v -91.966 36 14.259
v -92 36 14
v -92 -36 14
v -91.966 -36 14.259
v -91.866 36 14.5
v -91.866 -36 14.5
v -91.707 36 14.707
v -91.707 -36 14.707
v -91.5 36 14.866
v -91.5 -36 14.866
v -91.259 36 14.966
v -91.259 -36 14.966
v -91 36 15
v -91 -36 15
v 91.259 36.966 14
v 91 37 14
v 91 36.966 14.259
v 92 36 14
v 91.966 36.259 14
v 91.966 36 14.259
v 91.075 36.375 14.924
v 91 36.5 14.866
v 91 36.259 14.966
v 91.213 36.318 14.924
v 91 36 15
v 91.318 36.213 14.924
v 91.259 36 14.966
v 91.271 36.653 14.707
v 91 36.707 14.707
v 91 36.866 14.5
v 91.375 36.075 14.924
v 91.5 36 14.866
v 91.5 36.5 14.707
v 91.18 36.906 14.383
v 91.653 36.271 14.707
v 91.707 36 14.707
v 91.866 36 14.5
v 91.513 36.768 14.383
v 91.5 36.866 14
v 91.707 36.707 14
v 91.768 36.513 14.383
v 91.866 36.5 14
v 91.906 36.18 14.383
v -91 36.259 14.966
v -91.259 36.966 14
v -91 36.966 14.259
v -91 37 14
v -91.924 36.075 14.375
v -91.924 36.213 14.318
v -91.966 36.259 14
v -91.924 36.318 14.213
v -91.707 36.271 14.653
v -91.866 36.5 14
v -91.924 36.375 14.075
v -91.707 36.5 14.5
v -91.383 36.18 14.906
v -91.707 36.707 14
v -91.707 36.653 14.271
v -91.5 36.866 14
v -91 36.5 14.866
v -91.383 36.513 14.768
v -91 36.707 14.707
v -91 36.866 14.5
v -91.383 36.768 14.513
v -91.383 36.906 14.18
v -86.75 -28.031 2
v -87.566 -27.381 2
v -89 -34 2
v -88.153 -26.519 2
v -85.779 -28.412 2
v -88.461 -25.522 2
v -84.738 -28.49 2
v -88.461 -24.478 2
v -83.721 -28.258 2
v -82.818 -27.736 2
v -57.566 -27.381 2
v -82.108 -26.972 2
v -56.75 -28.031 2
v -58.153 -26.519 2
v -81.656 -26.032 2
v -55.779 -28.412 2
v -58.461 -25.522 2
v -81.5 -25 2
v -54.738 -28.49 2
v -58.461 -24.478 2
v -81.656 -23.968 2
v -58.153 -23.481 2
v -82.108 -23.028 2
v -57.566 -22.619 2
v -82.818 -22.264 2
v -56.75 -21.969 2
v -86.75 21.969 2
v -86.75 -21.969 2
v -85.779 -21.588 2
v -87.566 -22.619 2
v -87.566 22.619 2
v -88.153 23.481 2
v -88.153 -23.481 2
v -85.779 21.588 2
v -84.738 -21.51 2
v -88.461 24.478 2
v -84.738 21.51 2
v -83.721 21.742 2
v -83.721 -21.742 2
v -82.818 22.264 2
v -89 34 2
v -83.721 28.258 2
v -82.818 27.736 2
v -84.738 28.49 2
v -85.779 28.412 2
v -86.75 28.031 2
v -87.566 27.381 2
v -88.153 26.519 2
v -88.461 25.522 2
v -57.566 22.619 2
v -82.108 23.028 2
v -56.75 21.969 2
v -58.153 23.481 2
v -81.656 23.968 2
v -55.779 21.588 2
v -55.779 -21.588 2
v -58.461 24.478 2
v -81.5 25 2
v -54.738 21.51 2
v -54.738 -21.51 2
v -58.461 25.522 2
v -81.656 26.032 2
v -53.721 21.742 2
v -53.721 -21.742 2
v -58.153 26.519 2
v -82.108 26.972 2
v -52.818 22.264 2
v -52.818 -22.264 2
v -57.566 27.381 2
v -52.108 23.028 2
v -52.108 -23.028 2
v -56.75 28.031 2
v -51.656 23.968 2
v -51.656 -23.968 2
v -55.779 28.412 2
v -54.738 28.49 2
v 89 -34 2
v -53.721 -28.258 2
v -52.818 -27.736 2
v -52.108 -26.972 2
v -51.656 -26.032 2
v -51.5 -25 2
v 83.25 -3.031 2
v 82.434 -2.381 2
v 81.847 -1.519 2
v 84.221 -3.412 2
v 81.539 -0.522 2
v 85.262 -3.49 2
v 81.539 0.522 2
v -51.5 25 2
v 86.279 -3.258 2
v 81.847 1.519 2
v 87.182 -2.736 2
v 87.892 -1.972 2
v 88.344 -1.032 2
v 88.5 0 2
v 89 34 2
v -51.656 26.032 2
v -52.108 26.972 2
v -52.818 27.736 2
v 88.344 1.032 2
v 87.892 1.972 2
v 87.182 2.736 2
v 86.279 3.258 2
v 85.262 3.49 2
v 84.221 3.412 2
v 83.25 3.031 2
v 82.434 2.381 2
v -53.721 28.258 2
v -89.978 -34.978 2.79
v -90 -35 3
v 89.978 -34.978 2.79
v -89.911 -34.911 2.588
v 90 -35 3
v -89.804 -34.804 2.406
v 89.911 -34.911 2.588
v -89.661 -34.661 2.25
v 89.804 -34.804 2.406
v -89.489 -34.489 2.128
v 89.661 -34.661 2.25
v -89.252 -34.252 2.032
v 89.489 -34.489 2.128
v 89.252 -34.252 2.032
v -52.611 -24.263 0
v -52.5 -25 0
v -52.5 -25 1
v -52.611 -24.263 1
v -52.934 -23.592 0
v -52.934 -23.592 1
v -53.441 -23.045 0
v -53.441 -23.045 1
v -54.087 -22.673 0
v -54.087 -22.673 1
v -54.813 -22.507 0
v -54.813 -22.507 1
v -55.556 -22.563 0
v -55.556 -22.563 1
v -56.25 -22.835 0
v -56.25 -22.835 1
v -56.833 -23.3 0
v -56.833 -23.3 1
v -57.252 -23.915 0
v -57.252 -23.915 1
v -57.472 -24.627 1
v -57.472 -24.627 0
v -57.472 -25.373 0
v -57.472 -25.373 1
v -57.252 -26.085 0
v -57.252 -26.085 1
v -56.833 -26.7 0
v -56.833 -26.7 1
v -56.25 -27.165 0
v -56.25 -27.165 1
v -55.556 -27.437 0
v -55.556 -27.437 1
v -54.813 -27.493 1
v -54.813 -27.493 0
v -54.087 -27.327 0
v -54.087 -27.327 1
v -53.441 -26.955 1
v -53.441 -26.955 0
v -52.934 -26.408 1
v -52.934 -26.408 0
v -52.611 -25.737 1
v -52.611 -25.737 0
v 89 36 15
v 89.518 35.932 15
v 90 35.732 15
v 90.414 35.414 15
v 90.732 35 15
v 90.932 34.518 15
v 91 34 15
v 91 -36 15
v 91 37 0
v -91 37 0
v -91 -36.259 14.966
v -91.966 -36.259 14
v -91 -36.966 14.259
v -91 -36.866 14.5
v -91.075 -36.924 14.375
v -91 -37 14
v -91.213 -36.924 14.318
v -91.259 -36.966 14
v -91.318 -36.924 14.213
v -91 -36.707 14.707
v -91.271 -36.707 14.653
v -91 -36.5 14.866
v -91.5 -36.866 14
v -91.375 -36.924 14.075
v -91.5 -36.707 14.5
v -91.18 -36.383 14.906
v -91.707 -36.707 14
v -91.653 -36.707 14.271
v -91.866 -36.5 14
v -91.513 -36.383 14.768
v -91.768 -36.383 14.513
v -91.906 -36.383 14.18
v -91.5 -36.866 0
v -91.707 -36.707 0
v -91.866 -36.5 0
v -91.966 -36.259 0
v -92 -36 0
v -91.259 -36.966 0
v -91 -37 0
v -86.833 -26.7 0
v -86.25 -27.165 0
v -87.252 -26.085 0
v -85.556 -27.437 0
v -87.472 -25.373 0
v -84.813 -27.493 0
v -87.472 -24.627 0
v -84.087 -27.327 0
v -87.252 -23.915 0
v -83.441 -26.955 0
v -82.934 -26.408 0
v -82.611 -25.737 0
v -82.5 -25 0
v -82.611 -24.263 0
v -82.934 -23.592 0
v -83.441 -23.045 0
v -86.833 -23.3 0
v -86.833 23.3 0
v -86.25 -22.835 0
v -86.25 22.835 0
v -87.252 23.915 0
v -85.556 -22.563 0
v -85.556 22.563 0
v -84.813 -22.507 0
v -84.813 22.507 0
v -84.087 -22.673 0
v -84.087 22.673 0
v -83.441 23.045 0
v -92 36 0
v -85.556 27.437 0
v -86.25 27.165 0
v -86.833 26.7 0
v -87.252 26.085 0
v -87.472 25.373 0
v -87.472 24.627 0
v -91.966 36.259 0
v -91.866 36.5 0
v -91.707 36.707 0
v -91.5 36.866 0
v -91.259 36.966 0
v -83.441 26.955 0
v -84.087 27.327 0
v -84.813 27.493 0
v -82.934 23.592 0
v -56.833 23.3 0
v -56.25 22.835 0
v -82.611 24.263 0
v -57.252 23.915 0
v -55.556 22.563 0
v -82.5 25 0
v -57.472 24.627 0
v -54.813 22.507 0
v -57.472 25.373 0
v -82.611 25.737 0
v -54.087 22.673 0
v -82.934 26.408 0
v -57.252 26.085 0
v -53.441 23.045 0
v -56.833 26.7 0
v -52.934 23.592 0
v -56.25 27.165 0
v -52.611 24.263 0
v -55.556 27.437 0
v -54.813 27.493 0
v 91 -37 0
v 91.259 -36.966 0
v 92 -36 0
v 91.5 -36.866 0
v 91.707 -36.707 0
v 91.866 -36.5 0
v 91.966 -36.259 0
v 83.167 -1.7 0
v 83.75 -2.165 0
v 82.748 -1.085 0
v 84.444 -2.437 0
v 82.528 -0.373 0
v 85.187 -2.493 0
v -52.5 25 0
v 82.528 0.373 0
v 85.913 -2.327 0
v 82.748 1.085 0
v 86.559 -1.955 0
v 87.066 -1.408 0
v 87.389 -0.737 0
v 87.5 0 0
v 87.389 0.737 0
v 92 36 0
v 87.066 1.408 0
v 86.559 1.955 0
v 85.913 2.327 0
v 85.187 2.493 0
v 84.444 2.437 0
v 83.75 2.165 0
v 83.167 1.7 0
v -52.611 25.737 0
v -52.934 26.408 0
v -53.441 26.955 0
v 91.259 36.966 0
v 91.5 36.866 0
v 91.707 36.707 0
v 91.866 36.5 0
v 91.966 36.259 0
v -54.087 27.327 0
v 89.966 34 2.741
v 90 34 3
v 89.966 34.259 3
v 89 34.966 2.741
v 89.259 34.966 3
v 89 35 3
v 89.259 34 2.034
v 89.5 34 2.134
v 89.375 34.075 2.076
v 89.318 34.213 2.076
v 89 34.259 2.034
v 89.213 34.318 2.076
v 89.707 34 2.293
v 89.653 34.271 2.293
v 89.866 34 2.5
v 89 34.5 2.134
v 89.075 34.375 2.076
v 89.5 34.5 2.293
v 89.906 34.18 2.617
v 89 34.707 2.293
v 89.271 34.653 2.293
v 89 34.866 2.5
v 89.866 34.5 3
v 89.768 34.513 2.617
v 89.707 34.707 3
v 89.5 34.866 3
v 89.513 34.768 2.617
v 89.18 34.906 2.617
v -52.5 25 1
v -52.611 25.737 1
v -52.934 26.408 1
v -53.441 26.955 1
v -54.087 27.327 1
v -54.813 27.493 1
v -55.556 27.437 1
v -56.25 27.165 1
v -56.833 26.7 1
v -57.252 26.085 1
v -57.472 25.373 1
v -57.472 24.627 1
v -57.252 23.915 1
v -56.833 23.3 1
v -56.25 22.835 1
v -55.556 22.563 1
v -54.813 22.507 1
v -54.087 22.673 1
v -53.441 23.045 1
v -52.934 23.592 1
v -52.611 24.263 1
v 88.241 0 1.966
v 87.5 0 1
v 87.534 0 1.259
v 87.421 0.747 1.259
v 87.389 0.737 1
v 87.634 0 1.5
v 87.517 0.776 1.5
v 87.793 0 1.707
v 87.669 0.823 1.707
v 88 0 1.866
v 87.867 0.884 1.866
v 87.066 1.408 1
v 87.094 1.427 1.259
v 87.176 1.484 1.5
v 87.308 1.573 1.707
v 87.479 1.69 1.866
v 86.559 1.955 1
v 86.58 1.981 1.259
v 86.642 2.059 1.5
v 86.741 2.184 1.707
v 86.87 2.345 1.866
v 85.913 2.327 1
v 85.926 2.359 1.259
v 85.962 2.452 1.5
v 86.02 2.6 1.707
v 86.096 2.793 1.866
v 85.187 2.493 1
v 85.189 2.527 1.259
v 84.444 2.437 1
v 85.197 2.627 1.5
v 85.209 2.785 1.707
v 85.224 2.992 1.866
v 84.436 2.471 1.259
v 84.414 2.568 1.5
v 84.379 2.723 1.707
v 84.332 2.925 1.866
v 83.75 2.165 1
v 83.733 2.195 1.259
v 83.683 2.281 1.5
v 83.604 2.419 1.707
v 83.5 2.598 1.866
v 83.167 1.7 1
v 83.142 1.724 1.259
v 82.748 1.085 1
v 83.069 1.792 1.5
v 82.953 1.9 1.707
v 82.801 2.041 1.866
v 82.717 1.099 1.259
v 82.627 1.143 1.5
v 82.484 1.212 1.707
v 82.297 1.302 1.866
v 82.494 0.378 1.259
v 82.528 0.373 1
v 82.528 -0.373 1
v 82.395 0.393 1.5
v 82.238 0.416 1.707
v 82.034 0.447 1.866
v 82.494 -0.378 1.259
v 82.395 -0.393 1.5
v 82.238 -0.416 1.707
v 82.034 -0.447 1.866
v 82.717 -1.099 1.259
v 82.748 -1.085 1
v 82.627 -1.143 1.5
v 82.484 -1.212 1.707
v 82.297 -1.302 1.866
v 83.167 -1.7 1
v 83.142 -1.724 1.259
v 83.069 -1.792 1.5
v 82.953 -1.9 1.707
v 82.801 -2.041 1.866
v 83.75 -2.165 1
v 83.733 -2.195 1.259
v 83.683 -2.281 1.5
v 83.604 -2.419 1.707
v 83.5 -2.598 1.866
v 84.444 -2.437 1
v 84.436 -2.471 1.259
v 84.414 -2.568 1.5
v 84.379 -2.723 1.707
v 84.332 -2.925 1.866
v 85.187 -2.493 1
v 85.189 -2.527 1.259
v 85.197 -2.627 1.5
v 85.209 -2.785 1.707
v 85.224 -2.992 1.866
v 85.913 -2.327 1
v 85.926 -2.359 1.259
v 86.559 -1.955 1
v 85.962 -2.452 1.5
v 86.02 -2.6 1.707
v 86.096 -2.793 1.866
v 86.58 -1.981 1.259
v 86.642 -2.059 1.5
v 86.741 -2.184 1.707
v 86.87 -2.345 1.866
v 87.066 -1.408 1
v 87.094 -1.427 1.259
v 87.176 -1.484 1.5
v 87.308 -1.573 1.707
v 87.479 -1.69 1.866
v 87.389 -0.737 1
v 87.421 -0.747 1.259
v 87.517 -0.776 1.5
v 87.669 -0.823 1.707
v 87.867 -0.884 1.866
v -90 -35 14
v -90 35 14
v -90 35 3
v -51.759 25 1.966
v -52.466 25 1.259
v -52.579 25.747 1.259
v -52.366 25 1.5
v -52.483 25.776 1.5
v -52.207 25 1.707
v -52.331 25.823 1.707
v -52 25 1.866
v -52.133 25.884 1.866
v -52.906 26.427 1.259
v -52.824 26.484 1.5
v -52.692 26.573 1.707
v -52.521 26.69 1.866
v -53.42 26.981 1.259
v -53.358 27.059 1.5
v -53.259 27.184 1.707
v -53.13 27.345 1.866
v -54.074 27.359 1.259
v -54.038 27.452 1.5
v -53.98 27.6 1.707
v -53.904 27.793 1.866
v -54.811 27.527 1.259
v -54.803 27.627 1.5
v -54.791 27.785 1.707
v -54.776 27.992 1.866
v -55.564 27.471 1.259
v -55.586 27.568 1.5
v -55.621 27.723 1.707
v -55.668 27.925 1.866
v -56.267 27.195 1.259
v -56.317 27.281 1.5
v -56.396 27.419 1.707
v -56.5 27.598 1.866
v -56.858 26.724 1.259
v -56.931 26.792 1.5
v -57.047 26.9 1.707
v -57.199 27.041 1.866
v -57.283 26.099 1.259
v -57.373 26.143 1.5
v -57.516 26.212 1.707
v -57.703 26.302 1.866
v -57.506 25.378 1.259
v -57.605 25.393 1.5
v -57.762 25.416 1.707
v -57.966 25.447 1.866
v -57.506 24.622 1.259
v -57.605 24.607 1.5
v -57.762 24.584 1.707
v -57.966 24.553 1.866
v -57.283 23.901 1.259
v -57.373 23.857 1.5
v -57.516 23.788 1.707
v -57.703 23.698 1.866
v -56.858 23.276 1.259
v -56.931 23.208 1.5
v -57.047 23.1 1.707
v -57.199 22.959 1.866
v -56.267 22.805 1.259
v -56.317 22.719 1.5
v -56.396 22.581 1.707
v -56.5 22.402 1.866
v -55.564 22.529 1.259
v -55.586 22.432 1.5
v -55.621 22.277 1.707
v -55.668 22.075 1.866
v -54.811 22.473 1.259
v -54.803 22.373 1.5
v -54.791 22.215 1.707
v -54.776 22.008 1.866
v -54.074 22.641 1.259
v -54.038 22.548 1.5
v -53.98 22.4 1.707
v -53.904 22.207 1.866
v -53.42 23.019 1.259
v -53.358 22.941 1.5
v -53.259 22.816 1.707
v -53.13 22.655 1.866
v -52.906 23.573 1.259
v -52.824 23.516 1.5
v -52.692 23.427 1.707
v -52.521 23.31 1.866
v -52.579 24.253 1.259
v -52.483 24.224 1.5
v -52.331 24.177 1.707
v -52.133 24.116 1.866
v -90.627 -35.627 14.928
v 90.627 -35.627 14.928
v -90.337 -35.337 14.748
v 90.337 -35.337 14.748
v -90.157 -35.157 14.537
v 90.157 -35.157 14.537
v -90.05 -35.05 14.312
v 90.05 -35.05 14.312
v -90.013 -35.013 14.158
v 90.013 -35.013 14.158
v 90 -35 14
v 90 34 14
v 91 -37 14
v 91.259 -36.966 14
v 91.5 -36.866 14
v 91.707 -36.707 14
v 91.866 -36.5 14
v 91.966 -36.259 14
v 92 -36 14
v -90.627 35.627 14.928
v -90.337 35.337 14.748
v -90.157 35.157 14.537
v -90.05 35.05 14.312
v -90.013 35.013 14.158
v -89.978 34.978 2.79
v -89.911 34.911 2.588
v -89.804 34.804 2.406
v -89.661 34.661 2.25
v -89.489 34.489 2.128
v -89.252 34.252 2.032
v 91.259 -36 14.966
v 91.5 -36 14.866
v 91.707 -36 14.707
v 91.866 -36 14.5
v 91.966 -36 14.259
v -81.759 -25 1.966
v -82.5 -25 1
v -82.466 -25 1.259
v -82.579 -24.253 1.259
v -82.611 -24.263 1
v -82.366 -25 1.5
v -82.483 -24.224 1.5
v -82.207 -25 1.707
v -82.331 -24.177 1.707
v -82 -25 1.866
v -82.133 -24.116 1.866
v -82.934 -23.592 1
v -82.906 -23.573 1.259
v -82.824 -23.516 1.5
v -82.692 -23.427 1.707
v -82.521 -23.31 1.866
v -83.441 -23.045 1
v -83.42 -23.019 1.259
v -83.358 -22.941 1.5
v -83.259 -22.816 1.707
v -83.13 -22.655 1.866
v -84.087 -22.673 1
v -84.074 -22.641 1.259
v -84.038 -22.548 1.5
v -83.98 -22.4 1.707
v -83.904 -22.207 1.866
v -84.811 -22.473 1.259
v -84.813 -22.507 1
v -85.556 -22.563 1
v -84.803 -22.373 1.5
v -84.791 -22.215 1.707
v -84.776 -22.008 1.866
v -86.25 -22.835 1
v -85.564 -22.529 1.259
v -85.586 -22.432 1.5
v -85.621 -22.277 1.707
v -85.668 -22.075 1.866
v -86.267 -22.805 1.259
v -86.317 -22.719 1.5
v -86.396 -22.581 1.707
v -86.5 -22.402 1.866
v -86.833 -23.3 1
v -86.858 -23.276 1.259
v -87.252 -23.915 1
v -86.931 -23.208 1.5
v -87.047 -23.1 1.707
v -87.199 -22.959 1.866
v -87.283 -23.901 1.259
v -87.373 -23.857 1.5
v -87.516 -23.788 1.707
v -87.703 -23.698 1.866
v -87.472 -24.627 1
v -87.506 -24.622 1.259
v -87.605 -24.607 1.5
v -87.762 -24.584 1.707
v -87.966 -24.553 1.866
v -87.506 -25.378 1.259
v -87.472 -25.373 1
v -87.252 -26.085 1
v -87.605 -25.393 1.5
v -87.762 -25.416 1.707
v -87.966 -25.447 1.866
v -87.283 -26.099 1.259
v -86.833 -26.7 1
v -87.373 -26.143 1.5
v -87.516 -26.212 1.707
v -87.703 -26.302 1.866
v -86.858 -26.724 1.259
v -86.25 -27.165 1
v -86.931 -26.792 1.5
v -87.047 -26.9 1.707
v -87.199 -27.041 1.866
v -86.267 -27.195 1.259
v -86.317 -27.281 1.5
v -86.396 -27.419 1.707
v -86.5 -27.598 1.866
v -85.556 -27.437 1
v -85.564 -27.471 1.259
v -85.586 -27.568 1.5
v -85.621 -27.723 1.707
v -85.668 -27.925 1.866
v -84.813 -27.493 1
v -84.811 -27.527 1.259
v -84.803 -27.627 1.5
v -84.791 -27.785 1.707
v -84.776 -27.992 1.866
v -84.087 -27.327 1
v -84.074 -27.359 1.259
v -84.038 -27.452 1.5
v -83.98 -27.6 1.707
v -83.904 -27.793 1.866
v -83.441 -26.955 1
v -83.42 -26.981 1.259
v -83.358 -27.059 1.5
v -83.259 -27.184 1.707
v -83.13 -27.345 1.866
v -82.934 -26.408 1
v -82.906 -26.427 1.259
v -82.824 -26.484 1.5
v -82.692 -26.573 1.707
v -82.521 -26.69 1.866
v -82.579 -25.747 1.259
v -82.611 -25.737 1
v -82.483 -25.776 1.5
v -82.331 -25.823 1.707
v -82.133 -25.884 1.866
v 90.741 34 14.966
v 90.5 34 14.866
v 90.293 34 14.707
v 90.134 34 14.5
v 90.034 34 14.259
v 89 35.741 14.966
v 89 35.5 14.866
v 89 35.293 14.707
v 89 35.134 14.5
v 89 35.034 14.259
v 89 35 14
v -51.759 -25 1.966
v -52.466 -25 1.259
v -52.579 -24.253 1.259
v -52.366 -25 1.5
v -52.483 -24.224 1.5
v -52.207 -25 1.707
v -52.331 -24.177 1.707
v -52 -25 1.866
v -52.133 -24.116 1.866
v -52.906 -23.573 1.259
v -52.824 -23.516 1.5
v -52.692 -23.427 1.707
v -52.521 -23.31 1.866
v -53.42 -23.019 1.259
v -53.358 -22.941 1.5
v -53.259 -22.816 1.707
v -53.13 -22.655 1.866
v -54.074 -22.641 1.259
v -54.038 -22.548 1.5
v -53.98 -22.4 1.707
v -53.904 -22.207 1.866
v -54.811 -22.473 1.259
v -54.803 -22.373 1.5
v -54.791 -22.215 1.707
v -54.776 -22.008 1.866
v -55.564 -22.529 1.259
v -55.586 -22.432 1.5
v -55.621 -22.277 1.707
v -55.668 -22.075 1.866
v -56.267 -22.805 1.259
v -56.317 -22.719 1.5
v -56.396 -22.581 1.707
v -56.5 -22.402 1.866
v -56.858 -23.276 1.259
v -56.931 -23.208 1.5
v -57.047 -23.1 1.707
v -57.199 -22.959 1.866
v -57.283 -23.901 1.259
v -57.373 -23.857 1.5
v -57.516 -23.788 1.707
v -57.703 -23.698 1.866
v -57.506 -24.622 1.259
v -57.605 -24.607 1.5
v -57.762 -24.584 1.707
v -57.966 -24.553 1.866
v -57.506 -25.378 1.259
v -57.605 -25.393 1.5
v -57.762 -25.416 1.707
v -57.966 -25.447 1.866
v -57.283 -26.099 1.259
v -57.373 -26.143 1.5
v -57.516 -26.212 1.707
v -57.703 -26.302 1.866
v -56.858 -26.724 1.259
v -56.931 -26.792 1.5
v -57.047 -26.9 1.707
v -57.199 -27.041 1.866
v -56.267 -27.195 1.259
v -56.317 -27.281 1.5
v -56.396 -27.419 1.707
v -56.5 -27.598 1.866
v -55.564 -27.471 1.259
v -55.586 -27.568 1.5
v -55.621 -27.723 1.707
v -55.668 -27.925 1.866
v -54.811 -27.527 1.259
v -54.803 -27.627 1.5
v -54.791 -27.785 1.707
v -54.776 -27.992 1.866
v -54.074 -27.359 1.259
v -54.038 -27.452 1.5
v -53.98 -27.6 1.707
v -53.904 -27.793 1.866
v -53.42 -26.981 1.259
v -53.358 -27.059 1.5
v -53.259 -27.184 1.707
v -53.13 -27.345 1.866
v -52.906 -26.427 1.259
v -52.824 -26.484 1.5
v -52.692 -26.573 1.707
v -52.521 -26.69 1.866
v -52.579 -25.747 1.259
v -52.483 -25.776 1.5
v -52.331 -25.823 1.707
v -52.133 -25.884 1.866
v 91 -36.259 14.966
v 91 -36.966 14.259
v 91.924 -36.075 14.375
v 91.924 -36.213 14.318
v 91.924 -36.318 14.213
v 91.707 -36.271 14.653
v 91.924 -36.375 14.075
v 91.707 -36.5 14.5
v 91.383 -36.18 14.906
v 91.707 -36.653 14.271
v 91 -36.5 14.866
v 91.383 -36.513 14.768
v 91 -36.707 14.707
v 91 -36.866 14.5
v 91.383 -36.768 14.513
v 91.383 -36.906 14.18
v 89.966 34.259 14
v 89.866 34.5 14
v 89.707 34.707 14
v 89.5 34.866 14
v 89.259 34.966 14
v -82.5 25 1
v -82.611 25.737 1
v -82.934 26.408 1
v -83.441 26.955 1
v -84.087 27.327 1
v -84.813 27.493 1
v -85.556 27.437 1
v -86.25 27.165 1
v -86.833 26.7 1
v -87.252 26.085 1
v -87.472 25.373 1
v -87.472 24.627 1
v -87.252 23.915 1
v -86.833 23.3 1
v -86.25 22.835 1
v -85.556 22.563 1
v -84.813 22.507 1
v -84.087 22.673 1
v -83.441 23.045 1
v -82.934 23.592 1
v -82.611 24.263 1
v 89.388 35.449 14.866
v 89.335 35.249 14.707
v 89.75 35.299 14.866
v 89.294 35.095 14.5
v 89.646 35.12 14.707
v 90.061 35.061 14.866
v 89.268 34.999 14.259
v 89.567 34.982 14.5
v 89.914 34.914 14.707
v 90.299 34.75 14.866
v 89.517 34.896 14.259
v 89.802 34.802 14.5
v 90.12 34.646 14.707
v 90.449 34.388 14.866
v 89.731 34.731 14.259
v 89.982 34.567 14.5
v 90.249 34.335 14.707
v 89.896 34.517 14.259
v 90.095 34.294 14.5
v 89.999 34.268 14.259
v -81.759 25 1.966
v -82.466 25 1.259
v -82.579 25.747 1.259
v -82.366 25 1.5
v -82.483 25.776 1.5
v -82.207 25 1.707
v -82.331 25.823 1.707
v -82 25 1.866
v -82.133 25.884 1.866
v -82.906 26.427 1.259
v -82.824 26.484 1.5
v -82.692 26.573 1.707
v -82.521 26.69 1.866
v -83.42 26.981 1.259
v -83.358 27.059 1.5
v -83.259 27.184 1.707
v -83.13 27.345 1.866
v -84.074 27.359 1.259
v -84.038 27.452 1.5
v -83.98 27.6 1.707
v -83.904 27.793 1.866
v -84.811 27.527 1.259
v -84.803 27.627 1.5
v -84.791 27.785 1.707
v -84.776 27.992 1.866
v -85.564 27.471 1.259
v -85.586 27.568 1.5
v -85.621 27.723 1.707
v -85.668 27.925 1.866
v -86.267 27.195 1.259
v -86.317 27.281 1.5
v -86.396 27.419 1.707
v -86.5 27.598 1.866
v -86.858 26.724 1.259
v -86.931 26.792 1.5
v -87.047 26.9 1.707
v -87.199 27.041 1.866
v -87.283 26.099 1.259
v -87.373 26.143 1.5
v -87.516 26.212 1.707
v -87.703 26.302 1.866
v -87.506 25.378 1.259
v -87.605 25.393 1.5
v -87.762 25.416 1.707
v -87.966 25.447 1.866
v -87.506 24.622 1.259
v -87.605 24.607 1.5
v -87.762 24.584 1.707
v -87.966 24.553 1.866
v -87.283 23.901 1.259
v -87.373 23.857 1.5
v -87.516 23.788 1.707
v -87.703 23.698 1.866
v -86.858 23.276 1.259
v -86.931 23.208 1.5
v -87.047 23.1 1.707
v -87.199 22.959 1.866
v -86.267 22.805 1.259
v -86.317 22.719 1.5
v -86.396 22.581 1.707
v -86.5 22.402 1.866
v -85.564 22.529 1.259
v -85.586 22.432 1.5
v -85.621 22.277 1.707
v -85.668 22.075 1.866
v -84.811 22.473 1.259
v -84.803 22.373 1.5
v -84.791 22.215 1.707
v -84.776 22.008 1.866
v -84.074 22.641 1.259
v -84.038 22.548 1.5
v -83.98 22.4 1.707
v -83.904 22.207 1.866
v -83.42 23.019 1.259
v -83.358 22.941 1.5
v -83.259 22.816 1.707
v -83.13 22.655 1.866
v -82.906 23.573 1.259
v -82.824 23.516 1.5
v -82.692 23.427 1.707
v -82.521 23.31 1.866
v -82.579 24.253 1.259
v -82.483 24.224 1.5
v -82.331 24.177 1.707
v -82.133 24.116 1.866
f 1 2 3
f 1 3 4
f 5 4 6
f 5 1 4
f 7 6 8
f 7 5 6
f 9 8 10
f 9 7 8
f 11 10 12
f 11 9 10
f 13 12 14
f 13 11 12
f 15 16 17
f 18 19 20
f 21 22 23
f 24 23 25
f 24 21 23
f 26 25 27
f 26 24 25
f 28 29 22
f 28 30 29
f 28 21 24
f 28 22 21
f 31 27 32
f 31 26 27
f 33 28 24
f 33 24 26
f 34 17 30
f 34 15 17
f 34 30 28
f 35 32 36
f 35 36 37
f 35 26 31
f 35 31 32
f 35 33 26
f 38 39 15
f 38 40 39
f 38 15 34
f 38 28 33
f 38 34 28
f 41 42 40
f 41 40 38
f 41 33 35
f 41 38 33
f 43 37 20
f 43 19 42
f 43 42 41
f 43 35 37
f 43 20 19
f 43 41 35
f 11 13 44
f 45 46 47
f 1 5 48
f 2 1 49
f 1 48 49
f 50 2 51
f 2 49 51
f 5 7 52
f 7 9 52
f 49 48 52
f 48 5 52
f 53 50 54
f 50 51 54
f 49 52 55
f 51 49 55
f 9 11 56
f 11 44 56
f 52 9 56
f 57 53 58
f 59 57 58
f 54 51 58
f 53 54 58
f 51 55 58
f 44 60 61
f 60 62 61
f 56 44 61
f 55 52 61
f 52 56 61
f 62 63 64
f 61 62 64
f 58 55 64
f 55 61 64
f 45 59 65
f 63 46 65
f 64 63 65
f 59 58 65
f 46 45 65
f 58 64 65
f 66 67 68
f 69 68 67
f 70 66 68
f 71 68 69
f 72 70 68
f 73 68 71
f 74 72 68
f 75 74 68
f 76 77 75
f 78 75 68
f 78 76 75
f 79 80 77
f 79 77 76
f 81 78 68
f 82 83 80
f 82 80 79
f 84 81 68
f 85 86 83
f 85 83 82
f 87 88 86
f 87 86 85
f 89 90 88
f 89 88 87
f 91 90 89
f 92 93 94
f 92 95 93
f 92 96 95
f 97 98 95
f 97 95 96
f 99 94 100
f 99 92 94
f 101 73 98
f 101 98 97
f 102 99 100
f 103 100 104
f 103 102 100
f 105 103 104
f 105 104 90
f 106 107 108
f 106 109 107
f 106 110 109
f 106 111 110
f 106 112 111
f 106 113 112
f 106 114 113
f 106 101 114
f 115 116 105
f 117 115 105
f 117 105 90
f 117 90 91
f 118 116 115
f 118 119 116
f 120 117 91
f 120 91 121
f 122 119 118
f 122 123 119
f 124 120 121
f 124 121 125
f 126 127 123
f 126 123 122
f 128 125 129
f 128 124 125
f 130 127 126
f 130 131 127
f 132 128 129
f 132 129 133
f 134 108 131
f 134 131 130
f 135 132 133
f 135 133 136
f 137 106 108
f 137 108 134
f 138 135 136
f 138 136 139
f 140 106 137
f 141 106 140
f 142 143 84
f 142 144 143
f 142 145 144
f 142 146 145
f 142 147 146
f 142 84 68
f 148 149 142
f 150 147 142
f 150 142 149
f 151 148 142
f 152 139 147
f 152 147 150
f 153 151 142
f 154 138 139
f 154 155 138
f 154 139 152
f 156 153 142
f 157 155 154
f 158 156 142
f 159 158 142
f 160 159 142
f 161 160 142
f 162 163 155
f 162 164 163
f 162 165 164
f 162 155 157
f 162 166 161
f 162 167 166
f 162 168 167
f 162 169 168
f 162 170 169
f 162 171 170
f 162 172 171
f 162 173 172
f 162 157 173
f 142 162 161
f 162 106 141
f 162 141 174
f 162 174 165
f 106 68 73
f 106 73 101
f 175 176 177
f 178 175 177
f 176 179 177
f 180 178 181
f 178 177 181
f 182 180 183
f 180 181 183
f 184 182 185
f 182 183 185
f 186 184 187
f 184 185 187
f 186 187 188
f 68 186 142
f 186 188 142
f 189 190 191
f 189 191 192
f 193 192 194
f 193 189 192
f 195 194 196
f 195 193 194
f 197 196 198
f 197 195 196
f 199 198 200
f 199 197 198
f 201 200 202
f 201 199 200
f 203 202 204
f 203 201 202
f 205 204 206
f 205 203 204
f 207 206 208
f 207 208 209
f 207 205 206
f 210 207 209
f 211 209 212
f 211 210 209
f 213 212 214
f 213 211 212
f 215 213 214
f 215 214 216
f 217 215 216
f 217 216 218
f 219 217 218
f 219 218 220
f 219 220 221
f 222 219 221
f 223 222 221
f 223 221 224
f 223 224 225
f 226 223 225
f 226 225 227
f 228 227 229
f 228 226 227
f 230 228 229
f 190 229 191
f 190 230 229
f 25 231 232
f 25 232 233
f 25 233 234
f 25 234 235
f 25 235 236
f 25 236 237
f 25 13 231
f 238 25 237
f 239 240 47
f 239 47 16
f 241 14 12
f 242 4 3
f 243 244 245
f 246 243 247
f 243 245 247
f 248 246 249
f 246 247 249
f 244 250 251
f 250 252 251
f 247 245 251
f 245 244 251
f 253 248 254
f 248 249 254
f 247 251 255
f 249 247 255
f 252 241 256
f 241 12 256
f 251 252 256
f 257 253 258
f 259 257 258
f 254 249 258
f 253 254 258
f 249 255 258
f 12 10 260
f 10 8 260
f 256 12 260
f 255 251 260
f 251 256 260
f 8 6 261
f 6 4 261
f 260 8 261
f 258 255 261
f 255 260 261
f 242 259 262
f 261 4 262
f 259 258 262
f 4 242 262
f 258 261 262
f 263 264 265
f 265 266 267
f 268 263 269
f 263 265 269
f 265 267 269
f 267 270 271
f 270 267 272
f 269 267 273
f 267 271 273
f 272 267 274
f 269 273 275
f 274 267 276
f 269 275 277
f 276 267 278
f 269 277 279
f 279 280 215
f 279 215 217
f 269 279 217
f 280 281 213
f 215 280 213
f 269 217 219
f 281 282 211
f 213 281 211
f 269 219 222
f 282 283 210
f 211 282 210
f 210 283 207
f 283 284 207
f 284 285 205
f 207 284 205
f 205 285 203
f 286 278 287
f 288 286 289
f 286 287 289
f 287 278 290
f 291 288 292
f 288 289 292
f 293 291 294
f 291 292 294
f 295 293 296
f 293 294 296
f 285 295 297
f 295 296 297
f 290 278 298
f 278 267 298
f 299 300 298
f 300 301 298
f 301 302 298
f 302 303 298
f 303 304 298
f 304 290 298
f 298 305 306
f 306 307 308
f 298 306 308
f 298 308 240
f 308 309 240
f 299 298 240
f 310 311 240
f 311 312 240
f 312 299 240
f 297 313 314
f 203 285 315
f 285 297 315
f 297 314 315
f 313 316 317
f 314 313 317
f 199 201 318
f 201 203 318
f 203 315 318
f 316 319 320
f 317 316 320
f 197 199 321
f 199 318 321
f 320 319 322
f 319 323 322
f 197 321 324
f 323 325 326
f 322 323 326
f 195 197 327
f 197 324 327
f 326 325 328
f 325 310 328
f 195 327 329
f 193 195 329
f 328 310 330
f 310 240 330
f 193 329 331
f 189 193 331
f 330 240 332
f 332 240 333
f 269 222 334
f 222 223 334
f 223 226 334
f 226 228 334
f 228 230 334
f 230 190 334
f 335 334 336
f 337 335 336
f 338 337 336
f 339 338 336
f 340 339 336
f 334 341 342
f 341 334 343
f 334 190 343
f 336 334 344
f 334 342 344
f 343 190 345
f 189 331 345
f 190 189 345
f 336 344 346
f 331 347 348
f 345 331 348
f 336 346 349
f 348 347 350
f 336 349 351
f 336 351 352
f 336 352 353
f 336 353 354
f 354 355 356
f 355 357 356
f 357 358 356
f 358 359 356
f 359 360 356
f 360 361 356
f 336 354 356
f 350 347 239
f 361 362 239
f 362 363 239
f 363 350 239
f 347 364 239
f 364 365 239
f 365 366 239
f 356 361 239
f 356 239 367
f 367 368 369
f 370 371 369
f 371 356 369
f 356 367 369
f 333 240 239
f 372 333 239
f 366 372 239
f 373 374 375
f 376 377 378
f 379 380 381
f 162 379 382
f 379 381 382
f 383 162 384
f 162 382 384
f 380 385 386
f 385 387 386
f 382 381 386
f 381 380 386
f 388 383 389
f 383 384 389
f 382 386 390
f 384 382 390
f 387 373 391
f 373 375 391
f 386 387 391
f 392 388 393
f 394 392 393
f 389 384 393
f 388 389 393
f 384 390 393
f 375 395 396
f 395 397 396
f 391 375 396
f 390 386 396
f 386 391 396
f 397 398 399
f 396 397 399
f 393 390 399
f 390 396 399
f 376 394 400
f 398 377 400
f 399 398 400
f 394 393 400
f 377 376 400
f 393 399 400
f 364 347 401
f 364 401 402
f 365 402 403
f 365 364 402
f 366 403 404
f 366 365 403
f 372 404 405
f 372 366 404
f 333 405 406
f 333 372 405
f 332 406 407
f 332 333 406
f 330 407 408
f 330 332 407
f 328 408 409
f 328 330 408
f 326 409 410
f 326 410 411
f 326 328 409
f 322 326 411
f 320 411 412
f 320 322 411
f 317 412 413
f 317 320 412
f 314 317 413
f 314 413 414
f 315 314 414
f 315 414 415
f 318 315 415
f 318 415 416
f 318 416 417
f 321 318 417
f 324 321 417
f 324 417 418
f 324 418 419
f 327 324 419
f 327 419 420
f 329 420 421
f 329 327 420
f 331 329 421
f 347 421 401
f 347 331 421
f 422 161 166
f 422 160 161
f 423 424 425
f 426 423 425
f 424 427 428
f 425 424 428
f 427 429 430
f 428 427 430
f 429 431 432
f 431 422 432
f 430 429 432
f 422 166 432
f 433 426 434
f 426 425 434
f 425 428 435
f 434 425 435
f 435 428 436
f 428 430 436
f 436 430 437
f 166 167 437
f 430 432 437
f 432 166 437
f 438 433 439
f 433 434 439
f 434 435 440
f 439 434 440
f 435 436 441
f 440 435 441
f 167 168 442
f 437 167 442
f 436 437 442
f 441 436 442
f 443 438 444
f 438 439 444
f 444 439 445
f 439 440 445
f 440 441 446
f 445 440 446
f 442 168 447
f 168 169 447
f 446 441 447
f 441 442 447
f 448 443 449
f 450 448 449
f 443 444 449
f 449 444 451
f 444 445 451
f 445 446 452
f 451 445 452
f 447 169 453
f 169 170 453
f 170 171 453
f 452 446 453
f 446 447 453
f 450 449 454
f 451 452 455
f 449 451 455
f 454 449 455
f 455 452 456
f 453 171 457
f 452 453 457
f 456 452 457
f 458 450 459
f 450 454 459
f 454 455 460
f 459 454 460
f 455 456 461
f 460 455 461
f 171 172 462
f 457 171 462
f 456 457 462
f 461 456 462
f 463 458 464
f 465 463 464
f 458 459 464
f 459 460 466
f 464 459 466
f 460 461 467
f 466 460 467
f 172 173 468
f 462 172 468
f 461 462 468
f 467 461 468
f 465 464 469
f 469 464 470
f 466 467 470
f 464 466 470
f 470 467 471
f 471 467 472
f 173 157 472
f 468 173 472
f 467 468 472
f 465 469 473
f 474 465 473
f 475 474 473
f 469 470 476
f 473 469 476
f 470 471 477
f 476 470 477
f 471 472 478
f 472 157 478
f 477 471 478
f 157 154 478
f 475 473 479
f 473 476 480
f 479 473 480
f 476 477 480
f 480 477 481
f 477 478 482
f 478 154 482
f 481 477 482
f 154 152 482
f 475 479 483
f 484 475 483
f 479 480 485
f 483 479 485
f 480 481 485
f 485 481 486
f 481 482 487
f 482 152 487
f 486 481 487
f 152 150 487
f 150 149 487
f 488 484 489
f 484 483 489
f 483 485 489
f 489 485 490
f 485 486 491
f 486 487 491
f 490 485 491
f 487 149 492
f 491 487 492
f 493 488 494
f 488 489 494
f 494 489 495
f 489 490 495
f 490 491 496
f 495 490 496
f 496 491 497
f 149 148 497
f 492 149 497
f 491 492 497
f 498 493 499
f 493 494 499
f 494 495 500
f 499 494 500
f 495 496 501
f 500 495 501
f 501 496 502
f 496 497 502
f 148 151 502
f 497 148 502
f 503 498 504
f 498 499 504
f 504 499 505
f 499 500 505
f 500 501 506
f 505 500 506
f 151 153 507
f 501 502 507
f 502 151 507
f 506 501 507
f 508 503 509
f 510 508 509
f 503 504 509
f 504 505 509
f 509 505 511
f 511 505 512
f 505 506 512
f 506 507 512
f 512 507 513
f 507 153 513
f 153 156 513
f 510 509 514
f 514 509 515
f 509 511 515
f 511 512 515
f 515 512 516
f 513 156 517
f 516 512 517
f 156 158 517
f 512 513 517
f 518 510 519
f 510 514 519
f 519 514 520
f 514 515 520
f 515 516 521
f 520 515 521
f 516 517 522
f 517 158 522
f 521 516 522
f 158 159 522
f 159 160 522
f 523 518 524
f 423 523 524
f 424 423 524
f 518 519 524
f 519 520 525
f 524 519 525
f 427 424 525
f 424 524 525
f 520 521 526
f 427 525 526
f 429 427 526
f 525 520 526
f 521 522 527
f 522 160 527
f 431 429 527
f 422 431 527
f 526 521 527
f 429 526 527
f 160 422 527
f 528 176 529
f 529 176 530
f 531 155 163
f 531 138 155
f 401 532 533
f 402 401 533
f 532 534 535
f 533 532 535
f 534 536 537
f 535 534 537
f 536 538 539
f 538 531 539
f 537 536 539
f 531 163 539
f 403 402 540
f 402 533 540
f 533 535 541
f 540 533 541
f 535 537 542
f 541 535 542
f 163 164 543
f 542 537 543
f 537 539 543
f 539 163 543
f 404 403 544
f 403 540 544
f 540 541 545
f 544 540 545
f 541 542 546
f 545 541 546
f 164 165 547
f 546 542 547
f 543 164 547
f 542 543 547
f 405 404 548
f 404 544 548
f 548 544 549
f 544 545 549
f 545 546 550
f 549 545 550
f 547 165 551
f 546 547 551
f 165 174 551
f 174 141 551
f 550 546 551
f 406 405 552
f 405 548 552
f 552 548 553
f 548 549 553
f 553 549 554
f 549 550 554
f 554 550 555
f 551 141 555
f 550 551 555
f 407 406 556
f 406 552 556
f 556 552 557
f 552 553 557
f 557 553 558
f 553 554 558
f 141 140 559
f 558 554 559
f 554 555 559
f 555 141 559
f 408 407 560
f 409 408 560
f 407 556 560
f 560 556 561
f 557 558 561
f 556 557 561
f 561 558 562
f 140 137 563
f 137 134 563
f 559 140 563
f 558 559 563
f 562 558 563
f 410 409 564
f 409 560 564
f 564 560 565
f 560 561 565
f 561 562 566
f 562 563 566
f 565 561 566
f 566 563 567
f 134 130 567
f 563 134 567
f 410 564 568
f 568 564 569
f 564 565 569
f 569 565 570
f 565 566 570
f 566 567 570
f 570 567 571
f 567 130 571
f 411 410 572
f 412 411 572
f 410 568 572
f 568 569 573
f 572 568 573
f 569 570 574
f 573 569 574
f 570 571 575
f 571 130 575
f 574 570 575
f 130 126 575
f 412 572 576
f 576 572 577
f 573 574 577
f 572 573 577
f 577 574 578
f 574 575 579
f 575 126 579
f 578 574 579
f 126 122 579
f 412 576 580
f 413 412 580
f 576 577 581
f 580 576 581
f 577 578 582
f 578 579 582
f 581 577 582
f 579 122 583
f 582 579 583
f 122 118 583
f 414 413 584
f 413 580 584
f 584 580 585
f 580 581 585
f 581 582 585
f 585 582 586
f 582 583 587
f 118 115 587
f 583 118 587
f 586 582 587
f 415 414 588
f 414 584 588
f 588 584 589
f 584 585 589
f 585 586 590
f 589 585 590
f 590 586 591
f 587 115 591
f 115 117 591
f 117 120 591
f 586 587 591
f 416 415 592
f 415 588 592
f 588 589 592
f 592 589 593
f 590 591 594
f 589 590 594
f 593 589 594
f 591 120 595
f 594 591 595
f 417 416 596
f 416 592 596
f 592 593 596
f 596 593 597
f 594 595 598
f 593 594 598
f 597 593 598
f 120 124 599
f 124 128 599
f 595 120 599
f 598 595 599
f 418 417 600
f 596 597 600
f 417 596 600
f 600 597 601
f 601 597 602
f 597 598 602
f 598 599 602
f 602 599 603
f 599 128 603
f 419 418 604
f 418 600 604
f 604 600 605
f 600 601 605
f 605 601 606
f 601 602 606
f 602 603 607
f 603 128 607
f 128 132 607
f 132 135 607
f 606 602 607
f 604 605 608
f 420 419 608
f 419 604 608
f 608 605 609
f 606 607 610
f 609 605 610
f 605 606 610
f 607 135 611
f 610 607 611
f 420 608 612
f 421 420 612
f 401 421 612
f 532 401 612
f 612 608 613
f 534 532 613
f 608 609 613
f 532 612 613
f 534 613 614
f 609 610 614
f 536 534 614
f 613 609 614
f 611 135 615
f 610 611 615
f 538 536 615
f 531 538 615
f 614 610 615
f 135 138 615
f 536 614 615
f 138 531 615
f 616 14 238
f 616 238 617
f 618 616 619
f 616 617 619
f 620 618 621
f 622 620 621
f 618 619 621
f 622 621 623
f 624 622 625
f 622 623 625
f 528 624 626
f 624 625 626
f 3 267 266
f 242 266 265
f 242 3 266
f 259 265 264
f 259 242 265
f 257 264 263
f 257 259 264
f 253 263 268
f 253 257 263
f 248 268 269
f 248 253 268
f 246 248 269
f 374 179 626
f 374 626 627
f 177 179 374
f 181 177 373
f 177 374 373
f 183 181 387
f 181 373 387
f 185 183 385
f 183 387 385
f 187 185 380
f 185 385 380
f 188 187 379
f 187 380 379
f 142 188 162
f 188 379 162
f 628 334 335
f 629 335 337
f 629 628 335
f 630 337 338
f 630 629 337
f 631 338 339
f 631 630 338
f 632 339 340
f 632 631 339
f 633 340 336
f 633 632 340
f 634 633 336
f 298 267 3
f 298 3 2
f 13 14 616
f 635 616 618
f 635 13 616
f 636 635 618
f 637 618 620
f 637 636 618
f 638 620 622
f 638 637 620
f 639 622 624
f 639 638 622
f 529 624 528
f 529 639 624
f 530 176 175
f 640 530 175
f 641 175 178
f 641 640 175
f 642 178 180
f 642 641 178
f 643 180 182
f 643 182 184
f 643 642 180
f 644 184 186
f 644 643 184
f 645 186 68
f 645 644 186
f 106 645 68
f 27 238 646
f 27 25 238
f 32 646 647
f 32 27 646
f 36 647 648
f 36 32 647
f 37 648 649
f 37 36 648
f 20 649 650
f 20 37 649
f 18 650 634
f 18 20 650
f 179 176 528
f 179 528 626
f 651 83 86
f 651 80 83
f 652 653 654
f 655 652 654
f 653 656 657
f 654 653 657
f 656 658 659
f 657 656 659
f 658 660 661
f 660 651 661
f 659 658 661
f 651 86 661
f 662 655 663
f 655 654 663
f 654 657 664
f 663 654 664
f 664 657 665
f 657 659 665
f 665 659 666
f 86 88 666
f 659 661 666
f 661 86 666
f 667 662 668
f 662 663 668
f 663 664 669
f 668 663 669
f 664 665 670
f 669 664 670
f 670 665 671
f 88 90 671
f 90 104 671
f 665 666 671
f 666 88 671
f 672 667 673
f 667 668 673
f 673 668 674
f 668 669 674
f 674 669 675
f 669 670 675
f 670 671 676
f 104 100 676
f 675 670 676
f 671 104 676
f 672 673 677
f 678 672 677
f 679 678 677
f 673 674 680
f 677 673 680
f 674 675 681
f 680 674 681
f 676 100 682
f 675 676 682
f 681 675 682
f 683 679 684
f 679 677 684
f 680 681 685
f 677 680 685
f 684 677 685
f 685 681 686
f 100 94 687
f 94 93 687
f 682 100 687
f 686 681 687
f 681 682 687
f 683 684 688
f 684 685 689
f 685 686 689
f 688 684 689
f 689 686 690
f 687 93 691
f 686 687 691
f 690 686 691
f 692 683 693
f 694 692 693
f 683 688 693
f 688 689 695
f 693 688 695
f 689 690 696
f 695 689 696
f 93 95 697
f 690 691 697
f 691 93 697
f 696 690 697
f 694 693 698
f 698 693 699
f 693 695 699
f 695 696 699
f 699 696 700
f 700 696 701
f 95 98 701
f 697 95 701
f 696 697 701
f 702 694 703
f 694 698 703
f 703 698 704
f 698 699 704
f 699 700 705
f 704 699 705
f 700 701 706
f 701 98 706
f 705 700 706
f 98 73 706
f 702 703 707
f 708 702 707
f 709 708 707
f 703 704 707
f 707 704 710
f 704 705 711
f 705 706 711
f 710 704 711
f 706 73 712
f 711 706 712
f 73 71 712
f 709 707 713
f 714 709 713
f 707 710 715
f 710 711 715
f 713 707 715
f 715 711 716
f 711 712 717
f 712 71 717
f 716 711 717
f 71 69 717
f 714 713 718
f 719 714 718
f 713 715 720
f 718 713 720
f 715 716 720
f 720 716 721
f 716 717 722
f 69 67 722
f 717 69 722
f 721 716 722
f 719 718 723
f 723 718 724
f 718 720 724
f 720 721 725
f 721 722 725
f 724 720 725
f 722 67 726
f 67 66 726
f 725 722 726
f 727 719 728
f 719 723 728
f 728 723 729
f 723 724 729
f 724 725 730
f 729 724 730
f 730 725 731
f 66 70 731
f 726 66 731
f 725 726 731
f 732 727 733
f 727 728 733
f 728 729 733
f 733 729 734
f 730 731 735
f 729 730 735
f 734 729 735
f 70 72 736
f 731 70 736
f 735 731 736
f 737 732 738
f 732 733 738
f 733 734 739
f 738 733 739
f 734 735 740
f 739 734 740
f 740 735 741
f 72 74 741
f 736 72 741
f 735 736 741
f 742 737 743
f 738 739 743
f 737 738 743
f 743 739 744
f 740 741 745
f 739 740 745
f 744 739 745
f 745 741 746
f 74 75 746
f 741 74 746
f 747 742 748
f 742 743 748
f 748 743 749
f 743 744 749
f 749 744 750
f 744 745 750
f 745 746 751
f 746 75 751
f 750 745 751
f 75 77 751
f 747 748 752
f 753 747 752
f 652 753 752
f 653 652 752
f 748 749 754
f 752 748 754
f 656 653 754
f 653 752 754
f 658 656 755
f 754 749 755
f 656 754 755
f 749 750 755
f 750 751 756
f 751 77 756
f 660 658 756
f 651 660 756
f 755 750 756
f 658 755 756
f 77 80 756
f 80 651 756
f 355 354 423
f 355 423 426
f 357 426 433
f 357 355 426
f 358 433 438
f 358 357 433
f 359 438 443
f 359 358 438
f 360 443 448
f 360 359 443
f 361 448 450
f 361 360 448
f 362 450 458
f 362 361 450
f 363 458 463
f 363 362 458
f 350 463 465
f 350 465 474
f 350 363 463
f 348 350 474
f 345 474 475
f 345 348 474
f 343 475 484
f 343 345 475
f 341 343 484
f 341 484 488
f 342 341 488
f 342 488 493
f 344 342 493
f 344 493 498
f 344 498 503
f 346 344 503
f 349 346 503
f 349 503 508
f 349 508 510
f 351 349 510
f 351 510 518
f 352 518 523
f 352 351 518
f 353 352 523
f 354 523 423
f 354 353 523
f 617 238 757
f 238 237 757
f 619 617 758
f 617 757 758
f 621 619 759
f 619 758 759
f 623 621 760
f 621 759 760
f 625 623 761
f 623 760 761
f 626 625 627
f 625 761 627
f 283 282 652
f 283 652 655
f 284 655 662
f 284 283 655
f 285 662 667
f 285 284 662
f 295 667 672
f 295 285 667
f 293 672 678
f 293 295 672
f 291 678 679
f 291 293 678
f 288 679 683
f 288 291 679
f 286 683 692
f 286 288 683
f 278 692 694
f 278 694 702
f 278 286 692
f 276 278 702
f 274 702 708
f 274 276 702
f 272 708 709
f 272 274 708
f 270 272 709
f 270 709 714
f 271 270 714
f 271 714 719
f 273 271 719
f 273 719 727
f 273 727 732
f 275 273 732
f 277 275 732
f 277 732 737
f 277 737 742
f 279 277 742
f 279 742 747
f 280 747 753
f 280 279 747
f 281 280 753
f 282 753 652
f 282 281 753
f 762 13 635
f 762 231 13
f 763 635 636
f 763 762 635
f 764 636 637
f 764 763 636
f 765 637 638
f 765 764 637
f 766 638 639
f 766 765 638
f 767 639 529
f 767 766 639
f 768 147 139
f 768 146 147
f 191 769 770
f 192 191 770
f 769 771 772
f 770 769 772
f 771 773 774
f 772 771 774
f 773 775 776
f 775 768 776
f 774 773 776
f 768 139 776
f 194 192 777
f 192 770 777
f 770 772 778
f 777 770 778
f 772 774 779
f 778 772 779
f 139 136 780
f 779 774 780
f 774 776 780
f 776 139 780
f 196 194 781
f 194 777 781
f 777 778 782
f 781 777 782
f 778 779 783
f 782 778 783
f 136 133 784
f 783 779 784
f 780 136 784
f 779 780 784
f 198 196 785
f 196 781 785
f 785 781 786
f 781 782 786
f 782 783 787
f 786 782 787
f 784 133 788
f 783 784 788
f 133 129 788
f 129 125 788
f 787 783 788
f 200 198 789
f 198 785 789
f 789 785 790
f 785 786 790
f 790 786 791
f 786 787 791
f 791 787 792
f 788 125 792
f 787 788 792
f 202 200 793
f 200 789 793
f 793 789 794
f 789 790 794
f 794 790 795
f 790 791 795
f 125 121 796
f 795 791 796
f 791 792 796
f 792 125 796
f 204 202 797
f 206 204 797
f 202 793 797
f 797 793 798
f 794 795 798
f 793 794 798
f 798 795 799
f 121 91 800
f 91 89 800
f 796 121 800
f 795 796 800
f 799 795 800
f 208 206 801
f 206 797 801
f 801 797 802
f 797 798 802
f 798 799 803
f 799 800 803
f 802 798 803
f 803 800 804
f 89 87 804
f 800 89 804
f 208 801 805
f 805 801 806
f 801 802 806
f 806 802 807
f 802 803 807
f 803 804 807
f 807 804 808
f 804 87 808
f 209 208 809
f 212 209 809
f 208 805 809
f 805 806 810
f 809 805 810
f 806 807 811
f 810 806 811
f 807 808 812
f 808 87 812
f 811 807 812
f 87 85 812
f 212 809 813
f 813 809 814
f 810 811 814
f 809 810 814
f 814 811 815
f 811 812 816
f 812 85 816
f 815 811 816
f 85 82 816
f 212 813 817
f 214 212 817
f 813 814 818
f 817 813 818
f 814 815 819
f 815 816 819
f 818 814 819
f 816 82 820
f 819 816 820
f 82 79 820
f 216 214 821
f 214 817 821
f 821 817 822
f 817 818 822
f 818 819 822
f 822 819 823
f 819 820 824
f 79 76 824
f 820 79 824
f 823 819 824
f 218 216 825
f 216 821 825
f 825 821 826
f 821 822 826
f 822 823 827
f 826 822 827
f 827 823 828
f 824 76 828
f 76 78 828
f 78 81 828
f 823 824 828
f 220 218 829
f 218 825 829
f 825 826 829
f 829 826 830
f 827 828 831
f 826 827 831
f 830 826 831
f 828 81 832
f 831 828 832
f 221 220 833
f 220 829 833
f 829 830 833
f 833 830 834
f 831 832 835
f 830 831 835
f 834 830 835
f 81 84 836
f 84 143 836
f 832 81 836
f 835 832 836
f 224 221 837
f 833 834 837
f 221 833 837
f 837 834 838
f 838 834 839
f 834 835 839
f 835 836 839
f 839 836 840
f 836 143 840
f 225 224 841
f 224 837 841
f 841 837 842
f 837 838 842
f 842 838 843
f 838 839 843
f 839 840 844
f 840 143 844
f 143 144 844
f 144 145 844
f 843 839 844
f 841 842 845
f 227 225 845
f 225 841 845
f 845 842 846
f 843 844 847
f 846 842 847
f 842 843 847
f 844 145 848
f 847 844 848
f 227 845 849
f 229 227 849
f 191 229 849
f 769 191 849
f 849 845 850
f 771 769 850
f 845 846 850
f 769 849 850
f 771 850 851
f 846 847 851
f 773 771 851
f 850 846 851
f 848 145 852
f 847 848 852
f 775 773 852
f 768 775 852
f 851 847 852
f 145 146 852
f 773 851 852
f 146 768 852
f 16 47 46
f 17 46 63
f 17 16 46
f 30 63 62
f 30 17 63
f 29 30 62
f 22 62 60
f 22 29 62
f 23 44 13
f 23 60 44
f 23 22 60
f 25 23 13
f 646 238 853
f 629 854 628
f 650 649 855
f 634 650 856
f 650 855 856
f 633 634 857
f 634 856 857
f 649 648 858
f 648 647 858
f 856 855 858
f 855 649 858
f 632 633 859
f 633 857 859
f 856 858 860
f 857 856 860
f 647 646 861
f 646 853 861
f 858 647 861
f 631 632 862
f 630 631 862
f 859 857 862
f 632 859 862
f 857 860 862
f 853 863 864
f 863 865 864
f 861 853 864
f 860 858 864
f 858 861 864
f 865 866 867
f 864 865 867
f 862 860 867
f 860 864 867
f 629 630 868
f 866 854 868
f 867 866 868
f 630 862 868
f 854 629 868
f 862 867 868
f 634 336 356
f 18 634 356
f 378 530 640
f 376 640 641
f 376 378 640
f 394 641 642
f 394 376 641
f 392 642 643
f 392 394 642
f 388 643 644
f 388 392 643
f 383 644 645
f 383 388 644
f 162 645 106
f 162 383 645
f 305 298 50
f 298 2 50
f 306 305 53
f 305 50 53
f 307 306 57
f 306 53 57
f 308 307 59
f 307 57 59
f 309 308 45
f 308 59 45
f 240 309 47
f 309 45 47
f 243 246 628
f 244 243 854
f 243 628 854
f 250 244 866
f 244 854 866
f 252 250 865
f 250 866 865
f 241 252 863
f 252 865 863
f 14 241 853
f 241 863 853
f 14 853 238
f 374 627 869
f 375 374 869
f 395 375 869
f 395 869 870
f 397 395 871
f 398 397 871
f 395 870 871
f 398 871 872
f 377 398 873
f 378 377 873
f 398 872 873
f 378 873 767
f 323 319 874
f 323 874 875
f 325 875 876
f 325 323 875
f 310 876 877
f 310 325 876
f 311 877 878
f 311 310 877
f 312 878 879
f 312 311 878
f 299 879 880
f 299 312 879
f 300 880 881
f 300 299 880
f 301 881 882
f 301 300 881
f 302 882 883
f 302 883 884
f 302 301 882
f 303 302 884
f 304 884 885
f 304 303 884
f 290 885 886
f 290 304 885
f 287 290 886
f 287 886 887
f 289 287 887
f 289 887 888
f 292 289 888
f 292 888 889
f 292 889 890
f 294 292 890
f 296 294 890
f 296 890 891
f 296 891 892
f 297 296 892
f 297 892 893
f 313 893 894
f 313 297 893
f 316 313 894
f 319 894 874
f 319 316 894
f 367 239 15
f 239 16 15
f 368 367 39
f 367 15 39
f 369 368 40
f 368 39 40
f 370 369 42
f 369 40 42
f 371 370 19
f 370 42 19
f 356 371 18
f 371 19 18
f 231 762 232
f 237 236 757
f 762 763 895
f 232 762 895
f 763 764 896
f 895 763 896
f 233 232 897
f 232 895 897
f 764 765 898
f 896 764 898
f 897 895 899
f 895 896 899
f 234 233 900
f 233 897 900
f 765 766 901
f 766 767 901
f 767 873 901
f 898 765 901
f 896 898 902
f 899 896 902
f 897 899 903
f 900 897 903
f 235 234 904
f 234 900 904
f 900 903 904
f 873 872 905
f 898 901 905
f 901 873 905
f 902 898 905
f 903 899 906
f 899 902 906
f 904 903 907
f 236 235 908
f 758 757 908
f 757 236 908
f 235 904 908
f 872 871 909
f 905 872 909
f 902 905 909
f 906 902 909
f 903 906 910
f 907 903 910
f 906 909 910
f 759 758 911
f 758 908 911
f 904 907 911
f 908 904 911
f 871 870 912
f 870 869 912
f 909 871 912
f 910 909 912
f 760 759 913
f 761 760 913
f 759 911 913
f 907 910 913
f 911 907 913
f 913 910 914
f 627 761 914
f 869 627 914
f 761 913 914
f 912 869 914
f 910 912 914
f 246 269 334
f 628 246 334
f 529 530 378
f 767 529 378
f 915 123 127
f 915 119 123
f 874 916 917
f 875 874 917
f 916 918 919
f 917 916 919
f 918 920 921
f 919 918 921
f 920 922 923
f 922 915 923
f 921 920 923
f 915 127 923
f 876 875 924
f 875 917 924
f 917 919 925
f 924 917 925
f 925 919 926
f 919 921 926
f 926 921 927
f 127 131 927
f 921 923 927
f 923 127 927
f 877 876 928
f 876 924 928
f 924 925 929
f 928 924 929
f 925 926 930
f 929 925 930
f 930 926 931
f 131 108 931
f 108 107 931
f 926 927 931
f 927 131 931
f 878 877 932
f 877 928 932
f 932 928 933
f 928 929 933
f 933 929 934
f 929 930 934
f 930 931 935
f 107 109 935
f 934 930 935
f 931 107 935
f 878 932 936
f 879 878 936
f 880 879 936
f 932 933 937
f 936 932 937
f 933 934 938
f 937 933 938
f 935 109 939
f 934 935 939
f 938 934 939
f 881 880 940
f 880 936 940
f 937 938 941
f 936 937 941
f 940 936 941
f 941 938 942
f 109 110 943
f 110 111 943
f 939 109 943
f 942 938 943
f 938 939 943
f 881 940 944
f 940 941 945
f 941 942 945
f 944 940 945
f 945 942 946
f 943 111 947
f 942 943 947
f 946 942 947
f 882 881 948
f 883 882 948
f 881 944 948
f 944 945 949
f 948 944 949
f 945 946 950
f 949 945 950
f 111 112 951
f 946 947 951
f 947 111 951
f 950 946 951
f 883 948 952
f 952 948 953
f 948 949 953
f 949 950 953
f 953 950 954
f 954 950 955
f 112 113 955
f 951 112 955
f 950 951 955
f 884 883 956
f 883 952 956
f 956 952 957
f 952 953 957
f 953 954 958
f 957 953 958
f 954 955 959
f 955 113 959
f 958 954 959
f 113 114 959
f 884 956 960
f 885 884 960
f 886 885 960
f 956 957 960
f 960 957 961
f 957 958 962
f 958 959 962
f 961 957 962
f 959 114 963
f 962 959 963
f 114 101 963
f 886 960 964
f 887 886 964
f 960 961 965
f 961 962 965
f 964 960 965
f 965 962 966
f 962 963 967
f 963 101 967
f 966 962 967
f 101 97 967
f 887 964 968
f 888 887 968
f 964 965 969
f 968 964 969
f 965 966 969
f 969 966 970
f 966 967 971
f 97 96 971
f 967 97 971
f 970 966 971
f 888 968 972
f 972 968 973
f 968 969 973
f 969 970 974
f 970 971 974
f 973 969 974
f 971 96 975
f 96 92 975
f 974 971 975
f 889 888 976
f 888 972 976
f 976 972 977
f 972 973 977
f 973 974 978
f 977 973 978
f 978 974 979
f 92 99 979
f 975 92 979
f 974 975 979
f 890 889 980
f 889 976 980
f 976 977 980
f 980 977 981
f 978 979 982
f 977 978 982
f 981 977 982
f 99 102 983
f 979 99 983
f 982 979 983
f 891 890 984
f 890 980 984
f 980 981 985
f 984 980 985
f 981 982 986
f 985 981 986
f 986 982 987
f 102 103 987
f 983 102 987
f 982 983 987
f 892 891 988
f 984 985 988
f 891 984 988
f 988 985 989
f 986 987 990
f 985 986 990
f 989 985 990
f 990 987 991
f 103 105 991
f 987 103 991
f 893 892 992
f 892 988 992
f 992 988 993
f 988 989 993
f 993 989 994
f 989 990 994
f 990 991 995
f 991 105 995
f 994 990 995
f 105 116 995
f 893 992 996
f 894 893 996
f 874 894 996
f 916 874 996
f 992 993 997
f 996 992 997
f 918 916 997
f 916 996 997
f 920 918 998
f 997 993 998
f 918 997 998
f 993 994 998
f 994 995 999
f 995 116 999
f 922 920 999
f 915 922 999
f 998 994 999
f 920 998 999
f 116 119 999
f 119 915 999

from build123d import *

# Parameters (mm, degrees)
F0_W     = 180
F0_H     = 70
F0_R     = 2.5
F1_DEPTH = 2
F0_W_2   = 184
F0_H_2   = 74
F2_DEPTH = 15
F3_DEPTH = 25
F4_R     = 0.99999


# Not quite as in the source:
# - a fillet or chamfer is up to 0.001 mm smaller than in the source, because OpenCascade refuses the exact size
# - a feature names something its author has since deleted; it is built from what else it names


with BuildPart() as f1:
    # F0 (on Top) → F1 (new body)
    with BuildSketch(Plane.XY):
        Rectangle(F0_W, F0_H)
        with Locations((-85, -25)):
            Circle(F0_R, mode=Mode.SUBTRACT)
        with Locations((-55, -25)):
            Circle(F0_R, mode=Mode.SUBTRACT)
        with Locations((-85, 25)):
            Circle(F0_R, mode=Mode.SUBTRACT)
        with Locations((-55, 25)):
            Circle(F0_R, mode=Mode.SUBTRACT)
        with Locations((85, 0)):
            Circle(F0_R, mode=Mode.SUBTRACT)
    extrude(amount=F1_DEPTH)

    # F0 (on Top) → F2 (join)
    with BuildSketch(Plane.XY):
        Rectangle(F0_W_2, F0_H_2)
        Rectangle(F0_W, F0_H, mode=Mode.SUBTRACT)
    extrude(amount=F2_DEPTH)

    # F0 (on Top) → F3 (cut)
    with BuildSketch(Plane.XY):
        with Locations((-55, -25)):
            Circle(F0_R)
        with Locations((-85, -25)):
            Circle(F0_R)
        with Locations((-85, 25)):
            Circle(F0_R)
        with Locations((-55, 25)):
            Circle(F0_R)
    extrude(amount=-F3_DEPTH, mode=Mode.SUBTRACT)

    # F4 (radius 1 in the source; OpenCascade refuses exactly that, so slightly less here)
    f4_edges = [f1.edges().sort_by_distance(p)[0] for p in [
        (92, 37, 7.5),
        (90, 35, 8.5),
        (0, 37, 15),
        (-92, 0, 15),
        (0, -37, 15),
        (92, 0, 15),
        (0, 35, 15),
        (90, 0, 15),
        (0, -35, 15),
        (-90, 0, 15),
        (92, -37, 7.5),
        (-92, -37, 7.5),
        (-92, 37, 7.5),
        (90, 0, 2),
        (0, 35, 2),
        (-90, 0, 2),
        (0, -35, 2),
        (-87.5, -25, 2),
        (-57.5, -25, 2),
        (-87.5, 25, 2),
        (-57.5, 25, 2),
        (82.5, 0, 2),
    ]]
    fillet(f4_edges, radius=F4_R)


solid = f1.part
